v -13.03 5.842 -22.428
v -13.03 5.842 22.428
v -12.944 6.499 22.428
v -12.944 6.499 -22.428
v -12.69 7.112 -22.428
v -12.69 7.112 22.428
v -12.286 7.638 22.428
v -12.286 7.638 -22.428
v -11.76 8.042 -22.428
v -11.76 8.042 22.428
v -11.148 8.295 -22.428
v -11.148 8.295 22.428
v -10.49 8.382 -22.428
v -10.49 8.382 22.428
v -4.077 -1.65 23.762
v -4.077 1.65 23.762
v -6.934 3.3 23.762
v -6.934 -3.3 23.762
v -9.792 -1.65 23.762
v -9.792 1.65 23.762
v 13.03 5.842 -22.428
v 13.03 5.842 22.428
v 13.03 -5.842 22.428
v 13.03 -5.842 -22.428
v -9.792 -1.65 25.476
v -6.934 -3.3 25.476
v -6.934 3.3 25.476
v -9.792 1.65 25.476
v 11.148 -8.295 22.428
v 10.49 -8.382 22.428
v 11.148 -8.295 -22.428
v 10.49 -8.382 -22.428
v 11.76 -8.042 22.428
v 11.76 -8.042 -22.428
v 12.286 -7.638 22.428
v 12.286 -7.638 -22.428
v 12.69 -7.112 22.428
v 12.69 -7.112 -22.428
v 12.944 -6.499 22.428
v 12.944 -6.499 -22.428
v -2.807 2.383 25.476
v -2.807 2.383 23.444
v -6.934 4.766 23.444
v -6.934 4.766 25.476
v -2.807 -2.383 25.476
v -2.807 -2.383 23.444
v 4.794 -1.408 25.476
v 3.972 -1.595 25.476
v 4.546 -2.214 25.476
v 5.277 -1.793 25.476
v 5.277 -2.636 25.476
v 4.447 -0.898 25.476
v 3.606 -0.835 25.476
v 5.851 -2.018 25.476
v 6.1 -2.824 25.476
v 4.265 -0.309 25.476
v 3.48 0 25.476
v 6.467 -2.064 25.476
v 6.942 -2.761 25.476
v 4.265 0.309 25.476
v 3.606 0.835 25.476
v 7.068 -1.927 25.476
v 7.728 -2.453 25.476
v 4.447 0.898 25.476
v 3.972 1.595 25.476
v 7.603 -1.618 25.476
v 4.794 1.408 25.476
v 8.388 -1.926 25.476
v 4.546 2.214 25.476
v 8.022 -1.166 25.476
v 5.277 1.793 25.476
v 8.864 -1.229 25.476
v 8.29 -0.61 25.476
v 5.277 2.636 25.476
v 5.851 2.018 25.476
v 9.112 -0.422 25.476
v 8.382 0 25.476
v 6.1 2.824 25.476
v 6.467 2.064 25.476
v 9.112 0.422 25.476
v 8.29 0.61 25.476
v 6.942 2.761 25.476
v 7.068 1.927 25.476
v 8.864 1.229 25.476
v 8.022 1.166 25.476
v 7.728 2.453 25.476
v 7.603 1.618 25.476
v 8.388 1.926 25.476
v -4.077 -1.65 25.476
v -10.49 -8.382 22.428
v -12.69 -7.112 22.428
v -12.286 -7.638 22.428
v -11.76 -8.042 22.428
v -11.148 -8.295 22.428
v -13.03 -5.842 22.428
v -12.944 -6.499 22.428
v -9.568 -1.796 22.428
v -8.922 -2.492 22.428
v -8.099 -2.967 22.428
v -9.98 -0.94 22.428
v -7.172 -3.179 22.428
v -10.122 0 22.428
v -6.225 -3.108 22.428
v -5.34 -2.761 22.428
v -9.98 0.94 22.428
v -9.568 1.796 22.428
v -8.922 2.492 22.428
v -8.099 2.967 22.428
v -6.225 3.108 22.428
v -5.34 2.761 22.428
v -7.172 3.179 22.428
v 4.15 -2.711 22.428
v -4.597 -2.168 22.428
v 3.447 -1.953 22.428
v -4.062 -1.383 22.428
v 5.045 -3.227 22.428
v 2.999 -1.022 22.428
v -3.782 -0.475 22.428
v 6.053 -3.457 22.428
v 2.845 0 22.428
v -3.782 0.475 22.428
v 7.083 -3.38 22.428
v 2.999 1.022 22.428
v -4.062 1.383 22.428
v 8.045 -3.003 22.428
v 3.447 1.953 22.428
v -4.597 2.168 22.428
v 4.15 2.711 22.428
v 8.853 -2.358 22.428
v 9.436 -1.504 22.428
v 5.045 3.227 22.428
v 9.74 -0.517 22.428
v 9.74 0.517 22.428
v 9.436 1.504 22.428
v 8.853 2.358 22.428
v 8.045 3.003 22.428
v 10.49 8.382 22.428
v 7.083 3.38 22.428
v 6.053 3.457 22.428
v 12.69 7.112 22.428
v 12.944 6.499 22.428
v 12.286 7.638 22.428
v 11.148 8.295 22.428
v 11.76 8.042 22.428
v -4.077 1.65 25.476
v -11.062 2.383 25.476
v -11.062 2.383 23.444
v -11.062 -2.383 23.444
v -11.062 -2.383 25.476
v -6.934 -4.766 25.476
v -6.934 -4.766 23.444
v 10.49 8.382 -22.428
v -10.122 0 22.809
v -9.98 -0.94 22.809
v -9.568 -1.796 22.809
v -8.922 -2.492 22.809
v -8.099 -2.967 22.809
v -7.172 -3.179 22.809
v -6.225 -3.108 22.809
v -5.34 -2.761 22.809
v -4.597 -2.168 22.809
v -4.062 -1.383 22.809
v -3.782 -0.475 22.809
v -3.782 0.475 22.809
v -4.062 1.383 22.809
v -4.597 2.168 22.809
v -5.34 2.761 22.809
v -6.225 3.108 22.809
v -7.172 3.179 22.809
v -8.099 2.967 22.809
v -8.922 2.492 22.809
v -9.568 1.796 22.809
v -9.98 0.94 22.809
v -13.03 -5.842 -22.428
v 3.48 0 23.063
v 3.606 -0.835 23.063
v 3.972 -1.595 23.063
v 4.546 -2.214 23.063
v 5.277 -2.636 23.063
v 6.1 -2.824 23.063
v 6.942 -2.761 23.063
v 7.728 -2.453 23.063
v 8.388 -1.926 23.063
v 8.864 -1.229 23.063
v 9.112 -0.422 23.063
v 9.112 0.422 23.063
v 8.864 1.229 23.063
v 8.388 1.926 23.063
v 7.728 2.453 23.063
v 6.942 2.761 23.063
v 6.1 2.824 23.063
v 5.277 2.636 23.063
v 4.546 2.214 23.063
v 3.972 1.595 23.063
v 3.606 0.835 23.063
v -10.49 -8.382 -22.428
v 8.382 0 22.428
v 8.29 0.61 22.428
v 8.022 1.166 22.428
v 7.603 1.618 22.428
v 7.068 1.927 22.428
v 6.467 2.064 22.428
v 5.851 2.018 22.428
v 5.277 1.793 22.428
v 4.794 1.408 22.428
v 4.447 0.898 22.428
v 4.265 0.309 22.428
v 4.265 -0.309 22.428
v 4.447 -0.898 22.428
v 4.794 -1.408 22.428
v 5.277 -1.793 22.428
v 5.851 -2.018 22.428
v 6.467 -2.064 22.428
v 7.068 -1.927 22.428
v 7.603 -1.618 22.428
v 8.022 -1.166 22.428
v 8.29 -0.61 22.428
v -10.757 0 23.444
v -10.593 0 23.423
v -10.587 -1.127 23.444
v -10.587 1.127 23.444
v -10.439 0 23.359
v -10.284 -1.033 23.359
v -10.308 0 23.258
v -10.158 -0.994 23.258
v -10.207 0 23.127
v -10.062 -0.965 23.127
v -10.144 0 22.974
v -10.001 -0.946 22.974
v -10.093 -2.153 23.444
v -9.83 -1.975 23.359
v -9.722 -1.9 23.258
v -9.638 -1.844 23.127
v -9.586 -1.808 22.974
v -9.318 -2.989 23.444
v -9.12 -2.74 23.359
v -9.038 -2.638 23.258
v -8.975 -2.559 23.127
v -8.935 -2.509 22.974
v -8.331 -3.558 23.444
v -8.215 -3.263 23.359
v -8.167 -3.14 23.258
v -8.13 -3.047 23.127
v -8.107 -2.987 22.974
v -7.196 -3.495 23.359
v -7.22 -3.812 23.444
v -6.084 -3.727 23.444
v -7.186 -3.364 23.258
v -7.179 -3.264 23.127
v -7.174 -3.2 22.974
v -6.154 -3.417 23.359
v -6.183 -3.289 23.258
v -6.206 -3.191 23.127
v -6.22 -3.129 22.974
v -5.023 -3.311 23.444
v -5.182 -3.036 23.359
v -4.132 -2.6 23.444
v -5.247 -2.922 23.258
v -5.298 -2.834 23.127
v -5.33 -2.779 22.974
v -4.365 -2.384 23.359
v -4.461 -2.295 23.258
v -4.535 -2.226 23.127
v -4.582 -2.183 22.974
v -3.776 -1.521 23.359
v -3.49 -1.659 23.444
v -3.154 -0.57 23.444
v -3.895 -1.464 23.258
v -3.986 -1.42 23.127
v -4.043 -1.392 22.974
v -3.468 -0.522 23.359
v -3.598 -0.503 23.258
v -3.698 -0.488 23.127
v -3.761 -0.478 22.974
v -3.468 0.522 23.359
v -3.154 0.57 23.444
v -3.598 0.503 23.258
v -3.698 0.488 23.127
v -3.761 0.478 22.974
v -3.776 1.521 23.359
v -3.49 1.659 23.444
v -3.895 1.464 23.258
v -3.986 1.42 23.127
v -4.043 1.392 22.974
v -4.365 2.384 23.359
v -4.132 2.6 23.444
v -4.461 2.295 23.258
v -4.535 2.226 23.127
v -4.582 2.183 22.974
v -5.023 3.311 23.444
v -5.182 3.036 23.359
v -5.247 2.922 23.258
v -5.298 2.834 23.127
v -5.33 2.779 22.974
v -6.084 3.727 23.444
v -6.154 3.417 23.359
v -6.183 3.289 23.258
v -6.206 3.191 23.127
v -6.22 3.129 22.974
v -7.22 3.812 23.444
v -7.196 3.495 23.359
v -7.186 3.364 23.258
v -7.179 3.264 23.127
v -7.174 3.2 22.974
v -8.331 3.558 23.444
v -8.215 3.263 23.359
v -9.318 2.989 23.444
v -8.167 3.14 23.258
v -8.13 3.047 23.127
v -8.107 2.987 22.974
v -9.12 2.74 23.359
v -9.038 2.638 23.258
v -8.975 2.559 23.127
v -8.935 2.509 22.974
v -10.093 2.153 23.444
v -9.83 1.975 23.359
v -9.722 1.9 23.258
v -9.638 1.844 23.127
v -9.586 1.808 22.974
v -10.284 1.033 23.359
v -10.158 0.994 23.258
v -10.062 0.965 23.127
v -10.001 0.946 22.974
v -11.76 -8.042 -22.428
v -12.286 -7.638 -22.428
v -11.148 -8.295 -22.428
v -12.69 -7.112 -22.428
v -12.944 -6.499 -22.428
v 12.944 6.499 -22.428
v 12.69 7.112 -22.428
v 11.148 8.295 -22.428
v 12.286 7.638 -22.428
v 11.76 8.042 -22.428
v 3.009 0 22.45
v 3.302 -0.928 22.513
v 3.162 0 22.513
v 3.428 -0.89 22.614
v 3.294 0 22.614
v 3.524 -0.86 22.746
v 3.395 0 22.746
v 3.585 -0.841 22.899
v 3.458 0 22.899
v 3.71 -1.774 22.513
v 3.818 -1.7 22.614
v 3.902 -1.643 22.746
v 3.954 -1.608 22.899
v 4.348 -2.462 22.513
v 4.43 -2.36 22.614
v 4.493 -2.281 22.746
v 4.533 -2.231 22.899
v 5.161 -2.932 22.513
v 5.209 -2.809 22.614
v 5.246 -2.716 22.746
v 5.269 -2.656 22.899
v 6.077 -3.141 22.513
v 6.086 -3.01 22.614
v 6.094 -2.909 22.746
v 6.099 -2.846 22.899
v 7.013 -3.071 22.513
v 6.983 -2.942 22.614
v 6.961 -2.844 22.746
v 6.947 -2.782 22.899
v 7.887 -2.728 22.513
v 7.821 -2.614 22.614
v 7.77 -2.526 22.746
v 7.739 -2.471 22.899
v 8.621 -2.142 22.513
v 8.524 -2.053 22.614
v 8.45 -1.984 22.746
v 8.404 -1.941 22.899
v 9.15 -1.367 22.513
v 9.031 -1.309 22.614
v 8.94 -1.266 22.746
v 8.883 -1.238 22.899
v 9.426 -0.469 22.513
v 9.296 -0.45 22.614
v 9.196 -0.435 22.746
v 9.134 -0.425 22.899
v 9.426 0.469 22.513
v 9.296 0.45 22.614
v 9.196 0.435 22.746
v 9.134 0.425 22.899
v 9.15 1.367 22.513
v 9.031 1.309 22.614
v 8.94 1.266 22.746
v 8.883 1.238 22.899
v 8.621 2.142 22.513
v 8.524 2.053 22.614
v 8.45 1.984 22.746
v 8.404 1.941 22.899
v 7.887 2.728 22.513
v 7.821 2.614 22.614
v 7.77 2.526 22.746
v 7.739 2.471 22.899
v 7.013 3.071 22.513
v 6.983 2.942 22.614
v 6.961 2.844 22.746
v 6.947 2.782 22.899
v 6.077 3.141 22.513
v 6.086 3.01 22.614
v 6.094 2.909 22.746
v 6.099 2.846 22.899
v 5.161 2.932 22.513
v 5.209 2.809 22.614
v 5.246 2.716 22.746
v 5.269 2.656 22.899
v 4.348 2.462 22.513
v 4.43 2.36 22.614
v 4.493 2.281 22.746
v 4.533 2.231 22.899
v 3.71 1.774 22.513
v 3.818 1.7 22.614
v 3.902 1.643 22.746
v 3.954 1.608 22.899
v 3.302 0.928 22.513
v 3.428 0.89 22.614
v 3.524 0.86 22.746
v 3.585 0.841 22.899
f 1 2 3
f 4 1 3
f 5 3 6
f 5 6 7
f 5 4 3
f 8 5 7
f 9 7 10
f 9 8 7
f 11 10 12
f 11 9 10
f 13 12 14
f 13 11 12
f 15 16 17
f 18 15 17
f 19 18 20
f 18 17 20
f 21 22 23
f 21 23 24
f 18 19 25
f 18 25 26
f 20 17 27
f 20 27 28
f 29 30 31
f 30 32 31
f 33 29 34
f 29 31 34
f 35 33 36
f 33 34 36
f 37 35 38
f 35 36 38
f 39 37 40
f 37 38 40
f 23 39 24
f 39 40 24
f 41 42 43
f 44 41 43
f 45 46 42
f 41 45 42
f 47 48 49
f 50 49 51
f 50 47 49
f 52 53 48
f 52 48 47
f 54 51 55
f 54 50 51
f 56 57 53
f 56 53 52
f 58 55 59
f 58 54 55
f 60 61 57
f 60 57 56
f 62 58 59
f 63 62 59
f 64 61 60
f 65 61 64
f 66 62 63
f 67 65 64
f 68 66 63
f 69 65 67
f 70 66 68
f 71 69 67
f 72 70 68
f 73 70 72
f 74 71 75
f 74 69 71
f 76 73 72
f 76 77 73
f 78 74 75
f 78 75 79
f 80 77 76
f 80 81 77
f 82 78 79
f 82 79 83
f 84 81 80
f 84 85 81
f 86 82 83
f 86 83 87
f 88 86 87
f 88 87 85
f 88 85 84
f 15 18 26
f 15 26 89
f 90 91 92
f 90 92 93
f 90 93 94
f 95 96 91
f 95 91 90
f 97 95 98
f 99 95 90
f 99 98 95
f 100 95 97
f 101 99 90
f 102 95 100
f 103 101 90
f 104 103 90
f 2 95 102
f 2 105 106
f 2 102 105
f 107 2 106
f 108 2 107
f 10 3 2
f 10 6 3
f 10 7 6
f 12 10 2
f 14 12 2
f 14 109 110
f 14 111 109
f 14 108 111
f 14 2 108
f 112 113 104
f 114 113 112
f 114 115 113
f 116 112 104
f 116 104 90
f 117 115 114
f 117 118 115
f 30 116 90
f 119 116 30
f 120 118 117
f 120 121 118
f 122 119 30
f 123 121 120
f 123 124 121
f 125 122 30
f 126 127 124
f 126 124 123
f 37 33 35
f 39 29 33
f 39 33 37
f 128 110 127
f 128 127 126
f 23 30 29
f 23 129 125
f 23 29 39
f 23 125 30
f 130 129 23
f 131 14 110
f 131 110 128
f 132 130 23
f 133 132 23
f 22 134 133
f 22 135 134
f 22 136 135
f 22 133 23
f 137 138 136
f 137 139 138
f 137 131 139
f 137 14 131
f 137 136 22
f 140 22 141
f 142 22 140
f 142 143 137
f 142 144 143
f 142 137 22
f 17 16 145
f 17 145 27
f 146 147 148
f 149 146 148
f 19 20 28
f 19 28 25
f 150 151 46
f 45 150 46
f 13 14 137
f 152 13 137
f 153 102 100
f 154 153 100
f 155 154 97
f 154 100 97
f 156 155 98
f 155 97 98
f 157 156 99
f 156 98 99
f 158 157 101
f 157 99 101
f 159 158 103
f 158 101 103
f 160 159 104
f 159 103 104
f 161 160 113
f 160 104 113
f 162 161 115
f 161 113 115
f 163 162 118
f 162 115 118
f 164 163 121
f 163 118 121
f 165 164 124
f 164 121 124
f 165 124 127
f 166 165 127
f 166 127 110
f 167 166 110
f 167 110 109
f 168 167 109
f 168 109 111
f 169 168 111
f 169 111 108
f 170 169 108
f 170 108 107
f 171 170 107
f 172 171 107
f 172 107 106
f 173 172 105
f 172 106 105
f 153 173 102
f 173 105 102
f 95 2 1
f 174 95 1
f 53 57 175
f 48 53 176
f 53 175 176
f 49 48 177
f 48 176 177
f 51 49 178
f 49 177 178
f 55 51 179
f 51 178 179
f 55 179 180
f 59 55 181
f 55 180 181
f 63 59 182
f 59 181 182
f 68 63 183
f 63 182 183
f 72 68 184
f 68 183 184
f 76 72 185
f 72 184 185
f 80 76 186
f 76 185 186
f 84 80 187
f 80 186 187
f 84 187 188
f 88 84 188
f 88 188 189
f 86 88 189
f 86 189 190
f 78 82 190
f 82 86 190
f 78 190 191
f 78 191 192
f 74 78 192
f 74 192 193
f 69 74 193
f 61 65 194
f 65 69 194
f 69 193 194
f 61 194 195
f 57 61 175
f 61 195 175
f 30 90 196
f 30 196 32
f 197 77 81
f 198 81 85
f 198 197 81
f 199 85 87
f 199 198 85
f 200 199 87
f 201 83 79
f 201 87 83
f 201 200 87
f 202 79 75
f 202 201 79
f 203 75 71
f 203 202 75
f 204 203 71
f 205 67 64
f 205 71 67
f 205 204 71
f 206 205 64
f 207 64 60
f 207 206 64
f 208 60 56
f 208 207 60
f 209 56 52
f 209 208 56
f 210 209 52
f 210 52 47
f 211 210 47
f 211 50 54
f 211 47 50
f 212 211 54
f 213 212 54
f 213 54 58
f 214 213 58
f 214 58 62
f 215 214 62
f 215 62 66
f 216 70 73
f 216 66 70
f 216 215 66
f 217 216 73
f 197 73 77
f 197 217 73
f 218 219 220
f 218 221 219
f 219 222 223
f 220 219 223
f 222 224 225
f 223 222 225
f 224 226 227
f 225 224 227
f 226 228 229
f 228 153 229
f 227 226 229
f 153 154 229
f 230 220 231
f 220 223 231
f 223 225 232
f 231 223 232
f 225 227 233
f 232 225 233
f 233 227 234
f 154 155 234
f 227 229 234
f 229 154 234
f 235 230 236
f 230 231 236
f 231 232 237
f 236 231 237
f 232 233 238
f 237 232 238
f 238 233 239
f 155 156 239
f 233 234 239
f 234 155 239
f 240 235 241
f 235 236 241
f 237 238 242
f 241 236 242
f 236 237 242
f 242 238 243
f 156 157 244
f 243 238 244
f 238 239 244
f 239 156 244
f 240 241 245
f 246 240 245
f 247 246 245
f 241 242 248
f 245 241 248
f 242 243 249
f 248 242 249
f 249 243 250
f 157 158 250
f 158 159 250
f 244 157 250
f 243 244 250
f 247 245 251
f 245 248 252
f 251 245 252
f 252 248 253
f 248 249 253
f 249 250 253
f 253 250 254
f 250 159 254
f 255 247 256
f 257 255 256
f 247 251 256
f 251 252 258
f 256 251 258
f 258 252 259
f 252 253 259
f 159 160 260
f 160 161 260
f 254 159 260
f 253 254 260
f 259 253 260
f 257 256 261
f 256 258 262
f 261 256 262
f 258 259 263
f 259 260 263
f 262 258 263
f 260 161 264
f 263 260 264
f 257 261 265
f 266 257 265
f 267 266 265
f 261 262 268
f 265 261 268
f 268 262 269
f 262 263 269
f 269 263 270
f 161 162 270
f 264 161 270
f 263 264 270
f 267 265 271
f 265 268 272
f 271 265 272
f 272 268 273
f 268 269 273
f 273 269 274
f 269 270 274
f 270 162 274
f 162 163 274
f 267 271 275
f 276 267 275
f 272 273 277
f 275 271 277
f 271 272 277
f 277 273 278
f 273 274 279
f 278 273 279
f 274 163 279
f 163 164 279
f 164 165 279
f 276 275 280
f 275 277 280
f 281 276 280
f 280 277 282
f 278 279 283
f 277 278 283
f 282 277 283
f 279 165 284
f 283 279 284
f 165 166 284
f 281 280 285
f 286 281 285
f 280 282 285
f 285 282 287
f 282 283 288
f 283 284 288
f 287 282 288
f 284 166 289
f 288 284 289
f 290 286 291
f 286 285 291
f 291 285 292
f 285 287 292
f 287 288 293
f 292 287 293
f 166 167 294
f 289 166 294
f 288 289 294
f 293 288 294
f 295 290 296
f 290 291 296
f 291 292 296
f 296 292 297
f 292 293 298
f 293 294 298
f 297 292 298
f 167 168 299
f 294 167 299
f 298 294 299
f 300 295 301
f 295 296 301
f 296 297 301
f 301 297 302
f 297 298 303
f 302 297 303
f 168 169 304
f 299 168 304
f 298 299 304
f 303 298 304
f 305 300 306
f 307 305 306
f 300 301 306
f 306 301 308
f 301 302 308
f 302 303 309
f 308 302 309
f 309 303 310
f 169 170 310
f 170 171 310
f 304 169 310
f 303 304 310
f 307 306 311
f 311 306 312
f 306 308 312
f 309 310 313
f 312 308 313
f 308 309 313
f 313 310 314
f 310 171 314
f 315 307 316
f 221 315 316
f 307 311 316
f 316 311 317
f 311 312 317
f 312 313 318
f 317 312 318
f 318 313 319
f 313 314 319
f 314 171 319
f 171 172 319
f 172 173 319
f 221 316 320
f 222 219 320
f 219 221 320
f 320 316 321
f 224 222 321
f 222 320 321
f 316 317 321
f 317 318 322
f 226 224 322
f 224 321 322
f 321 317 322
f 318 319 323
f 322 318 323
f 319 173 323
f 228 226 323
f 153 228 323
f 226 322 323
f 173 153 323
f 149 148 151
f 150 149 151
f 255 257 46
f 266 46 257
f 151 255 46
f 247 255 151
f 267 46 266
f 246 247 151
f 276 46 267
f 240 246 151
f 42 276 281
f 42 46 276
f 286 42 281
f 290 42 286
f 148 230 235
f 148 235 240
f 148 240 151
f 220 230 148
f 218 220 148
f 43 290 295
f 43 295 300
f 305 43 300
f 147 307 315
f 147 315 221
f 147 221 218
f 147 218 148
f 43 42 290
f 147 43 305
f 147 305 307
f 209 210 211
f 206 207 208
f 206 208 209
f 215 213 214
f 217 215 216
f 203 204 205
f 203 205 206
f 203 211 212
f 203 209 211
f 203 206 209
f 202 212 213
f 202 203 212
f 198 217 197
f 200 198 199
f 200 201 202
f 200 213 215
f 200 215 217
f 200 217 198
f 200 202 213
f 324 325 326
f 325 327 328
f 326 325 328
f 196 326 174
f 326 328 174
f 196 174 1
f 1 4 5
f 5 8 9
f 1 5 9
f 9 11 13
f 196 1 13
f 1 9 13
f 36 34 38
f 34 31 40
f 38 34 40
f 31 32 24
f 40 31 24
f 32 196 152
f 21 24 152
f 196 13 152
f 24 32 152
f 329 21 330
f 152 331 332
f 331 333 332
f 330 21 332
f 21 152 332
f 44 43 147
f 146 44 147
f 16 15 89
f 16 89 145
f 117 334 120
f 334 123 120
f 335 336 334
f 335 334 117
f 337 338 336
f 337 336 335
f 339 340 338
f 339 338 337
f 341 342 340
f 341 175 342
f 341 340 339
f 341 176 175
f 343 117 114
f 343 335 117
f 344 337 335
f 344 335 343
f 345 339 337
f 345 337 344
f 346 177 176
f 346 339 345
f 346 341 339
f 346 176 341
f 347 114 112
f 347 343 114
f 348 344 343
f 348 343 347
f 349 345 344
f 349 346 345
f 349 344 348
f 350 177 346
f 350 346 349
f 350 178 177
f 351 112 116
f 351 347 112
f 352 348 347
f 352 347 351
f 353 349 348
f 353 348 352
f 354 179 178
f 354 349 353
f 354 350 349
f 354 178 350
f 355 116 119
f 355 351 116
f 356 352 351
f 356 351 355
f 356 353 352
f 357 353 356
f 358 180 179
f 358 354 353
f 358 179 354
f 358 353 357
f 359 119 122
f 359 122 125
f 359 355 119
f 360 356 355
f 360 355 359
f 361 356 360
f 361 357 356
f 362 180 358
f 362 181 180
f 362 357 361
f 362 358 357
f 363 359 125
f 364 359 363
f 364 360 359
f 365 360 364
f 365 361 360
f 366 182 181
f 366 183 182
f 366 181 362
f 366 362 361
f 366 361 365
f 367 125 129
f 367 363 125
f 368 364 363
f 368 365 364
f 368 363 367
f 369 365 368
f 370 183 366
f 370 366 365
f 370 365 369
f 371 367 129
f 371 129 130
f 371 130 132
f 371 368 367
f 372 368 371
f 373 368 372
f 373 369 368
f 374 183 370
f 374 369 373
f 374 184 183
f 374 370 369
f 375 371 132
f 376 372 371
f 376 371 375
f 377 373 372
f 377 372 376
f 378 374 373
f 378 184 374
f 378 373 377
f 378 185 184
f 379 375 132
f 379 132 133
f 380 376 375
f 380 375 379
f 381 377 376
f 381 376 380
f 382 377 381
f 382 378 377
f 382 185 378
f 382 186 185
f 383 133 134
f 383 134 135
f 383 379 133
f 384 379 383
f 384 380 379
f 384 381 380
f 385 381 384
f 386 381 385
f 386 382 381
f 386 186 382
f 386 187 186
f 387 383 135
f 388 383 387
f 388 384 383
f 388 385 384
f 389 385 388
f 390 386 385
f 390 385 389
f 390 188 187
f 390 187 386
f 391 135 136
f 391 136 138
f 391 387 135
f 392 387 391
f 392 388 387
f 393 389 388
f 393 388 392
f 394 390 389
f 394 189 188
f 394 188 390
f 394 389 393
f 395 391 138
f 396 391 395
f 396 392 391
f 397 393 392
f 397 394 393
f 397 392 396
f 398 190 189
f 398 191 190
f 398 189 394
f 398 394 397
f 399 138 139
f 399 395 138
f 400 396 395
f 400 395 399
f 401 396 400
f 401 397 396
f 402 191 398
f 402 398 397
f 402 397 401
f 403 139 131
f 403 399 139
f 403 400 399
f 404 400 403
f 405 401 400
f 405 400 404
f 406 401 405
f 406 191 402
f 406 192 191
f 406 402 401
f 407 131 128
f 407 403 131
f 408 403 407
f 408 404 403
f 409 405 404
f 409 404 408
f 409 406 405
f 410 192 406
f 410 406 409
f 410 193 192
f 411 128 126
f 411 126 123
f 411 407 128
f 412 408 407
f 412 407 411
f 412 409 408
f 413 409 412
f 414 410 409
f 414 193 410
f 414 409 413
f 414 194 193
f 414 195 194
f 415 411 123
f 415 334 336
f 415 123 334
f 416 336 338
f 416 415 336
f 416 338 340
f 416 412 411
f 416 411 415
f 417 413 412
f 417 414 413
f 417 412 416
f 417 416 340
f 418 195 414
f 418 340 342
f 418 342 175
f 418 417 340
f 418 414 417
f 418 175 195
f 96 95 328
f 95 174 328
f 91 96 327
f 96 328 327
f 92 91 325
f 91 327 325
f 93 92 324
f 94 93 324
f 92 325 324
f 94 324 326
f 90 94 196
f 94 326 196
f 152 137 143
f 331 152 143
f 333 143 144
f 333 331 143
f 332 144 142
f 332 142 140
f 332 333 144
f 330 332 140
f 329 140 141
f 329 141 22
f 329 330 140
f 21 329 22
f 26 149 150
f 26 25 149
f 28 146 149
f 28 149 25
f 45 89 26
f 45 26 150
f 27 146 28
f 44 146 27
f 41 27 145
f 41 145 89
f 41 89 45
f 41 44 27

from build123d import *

# Parameters (mm, degrees)
SKETCH1_W           = 26.0604
SKETCH1_H           = 44.8564
BOSS_EXTRUDE1_DEPTH = 8.382
SKETCH2_R           = 2.8321
SKETCH2_R_2         = 2.0701
BOSS_EXTRUDE2_DEPTH = 3.2258
SKETCH3_R           = 3.1877
BOSS_EXTRUDE3_DEPTH = 1.016
BOSS_EXTRUDE4_DEPTH = 2.5654
FILLET1_R           = 2.54
FILLET2_R           = 0.635
BOSS_EXTRUDE5_DEPTH = 0.3175
FILLET3_R           = 0.635
SKETCH6_W           = 27.559321376
SKETCH6_H           = 27.598108844
CUT_EXTRUDE1_DEPTH  = 0.5334


with BuildPart() as part:
    # Sketch1 → Boss-Extrude1 (new, symmetric)
    with BuildSketch(Plane(origin=(0, 0, 0), x_dir=(1, 0, 0), z_dir=(0, 1, 0))):
        Rectangle(SKETCH1_W, SKETCH1_H)
    extrude(amount=BOSS_EXTRUDE1_DEPTH, both=True)

    # Sketch2 → Boss-Extrude2 (add)
    with BuildSketch(Plane.XY.offset(22.4282)):
        with Locations(Location((6.3119, 0, 0), (0, 0, 180))):
            Circle(SKETCH2_R)
        with Locations((6.3119, 0)):
            Circle(SKETCH2_R_2, mode=Mode.SUBTRACT)
    extrude(amount=BOSS_EXTRUDE2_DEPTH)

    # Sketch3 → Boss-Extrude3 (add)
    with BuildSketch(Plane.XY.offset(22.4282)):
        with Locations(Location((-6.9342, 0, 0), (0, 0, 180))):
            Circle(SKETCH3_R)
    extrude(amount=BOSS_EXTRUDE3_DEPTH)

    # Sketch4 → Boss-Extrude4 (add)
    with BuildSketch(Plane.XY.offset(23.4442)):
        Polygon((-2.8067, 2.383013236), (-6.9342, 4.766026472), (-11.0617, 2.383013236), (-11.0617, -2.383013236), (-6.9342, -4.766026472), (-2.8067, -2.383013236), align=None)
        Polygon((-9.7917, 1.649778394), (-9.7917, -1.649778394), (-6.9342, -3.299556788), (-4.0767, -1.649778394), (-4.0767, 1.649778394), (-6.9342, 3.299556788), align=None, mode=Mode.SUBTRACT)
    extrude(amount=BOSS_EXTRUDE4_DEPTH)

    # Fillet1
    fillet1_edges = [part.edges().sort_by_distance(p)[0] for p in [
        (-13.0302, 8.382, 0),
        (13.0302, 8.382, 0),
        (-13.0302, -8.382, 0),
        (13.0302, -8.382, 0),
    ]]
    fillet(fillet1_edges, radius=FILLET1_R)

    # Fillet2
    fillet2_edges = [part.edges().sort_by_distance(p)[0] for p in [
        (9.144, 0, 22.4282),
    ]]
    fillet(fillet2_edges, radius=FILLET2_R)

    # Sketch5 → Boss-Extrude5 (add)
    with BuildSketch(Plane.XY.offset(23.4442)):
        Polygon((-9.7917, -1.649778394), (-9.7917, 1.649778394), (-6.9342, 3.299556788), (-4.0767, 1.649778394), (-4.0767, -1.649778394), (-6.9342, -3.299556788), align=None)
    extrude(amount=BOSS_EXTRUDE5_DEPTH)

    # Fillet3
    fillet3_edges = [part.edges().sort_by_distance(p)[0] for p in [
        (-3.7465, 0, 23.4442),
    ]]
    fillet(fillet3_edges, radius=FILLET3_R)

    # Sketch6 → Cut-Extrude1 (cut)
    with BuildSketch(Plane.XY.offset(26.0096)):
        Rectangle(SKETCH6_W, SKETCH6_H)
    extrude(amount=-CUT_EXTRUDE1_DEPTH, mode=Mode.SUBTRACT)


solid = part.part
